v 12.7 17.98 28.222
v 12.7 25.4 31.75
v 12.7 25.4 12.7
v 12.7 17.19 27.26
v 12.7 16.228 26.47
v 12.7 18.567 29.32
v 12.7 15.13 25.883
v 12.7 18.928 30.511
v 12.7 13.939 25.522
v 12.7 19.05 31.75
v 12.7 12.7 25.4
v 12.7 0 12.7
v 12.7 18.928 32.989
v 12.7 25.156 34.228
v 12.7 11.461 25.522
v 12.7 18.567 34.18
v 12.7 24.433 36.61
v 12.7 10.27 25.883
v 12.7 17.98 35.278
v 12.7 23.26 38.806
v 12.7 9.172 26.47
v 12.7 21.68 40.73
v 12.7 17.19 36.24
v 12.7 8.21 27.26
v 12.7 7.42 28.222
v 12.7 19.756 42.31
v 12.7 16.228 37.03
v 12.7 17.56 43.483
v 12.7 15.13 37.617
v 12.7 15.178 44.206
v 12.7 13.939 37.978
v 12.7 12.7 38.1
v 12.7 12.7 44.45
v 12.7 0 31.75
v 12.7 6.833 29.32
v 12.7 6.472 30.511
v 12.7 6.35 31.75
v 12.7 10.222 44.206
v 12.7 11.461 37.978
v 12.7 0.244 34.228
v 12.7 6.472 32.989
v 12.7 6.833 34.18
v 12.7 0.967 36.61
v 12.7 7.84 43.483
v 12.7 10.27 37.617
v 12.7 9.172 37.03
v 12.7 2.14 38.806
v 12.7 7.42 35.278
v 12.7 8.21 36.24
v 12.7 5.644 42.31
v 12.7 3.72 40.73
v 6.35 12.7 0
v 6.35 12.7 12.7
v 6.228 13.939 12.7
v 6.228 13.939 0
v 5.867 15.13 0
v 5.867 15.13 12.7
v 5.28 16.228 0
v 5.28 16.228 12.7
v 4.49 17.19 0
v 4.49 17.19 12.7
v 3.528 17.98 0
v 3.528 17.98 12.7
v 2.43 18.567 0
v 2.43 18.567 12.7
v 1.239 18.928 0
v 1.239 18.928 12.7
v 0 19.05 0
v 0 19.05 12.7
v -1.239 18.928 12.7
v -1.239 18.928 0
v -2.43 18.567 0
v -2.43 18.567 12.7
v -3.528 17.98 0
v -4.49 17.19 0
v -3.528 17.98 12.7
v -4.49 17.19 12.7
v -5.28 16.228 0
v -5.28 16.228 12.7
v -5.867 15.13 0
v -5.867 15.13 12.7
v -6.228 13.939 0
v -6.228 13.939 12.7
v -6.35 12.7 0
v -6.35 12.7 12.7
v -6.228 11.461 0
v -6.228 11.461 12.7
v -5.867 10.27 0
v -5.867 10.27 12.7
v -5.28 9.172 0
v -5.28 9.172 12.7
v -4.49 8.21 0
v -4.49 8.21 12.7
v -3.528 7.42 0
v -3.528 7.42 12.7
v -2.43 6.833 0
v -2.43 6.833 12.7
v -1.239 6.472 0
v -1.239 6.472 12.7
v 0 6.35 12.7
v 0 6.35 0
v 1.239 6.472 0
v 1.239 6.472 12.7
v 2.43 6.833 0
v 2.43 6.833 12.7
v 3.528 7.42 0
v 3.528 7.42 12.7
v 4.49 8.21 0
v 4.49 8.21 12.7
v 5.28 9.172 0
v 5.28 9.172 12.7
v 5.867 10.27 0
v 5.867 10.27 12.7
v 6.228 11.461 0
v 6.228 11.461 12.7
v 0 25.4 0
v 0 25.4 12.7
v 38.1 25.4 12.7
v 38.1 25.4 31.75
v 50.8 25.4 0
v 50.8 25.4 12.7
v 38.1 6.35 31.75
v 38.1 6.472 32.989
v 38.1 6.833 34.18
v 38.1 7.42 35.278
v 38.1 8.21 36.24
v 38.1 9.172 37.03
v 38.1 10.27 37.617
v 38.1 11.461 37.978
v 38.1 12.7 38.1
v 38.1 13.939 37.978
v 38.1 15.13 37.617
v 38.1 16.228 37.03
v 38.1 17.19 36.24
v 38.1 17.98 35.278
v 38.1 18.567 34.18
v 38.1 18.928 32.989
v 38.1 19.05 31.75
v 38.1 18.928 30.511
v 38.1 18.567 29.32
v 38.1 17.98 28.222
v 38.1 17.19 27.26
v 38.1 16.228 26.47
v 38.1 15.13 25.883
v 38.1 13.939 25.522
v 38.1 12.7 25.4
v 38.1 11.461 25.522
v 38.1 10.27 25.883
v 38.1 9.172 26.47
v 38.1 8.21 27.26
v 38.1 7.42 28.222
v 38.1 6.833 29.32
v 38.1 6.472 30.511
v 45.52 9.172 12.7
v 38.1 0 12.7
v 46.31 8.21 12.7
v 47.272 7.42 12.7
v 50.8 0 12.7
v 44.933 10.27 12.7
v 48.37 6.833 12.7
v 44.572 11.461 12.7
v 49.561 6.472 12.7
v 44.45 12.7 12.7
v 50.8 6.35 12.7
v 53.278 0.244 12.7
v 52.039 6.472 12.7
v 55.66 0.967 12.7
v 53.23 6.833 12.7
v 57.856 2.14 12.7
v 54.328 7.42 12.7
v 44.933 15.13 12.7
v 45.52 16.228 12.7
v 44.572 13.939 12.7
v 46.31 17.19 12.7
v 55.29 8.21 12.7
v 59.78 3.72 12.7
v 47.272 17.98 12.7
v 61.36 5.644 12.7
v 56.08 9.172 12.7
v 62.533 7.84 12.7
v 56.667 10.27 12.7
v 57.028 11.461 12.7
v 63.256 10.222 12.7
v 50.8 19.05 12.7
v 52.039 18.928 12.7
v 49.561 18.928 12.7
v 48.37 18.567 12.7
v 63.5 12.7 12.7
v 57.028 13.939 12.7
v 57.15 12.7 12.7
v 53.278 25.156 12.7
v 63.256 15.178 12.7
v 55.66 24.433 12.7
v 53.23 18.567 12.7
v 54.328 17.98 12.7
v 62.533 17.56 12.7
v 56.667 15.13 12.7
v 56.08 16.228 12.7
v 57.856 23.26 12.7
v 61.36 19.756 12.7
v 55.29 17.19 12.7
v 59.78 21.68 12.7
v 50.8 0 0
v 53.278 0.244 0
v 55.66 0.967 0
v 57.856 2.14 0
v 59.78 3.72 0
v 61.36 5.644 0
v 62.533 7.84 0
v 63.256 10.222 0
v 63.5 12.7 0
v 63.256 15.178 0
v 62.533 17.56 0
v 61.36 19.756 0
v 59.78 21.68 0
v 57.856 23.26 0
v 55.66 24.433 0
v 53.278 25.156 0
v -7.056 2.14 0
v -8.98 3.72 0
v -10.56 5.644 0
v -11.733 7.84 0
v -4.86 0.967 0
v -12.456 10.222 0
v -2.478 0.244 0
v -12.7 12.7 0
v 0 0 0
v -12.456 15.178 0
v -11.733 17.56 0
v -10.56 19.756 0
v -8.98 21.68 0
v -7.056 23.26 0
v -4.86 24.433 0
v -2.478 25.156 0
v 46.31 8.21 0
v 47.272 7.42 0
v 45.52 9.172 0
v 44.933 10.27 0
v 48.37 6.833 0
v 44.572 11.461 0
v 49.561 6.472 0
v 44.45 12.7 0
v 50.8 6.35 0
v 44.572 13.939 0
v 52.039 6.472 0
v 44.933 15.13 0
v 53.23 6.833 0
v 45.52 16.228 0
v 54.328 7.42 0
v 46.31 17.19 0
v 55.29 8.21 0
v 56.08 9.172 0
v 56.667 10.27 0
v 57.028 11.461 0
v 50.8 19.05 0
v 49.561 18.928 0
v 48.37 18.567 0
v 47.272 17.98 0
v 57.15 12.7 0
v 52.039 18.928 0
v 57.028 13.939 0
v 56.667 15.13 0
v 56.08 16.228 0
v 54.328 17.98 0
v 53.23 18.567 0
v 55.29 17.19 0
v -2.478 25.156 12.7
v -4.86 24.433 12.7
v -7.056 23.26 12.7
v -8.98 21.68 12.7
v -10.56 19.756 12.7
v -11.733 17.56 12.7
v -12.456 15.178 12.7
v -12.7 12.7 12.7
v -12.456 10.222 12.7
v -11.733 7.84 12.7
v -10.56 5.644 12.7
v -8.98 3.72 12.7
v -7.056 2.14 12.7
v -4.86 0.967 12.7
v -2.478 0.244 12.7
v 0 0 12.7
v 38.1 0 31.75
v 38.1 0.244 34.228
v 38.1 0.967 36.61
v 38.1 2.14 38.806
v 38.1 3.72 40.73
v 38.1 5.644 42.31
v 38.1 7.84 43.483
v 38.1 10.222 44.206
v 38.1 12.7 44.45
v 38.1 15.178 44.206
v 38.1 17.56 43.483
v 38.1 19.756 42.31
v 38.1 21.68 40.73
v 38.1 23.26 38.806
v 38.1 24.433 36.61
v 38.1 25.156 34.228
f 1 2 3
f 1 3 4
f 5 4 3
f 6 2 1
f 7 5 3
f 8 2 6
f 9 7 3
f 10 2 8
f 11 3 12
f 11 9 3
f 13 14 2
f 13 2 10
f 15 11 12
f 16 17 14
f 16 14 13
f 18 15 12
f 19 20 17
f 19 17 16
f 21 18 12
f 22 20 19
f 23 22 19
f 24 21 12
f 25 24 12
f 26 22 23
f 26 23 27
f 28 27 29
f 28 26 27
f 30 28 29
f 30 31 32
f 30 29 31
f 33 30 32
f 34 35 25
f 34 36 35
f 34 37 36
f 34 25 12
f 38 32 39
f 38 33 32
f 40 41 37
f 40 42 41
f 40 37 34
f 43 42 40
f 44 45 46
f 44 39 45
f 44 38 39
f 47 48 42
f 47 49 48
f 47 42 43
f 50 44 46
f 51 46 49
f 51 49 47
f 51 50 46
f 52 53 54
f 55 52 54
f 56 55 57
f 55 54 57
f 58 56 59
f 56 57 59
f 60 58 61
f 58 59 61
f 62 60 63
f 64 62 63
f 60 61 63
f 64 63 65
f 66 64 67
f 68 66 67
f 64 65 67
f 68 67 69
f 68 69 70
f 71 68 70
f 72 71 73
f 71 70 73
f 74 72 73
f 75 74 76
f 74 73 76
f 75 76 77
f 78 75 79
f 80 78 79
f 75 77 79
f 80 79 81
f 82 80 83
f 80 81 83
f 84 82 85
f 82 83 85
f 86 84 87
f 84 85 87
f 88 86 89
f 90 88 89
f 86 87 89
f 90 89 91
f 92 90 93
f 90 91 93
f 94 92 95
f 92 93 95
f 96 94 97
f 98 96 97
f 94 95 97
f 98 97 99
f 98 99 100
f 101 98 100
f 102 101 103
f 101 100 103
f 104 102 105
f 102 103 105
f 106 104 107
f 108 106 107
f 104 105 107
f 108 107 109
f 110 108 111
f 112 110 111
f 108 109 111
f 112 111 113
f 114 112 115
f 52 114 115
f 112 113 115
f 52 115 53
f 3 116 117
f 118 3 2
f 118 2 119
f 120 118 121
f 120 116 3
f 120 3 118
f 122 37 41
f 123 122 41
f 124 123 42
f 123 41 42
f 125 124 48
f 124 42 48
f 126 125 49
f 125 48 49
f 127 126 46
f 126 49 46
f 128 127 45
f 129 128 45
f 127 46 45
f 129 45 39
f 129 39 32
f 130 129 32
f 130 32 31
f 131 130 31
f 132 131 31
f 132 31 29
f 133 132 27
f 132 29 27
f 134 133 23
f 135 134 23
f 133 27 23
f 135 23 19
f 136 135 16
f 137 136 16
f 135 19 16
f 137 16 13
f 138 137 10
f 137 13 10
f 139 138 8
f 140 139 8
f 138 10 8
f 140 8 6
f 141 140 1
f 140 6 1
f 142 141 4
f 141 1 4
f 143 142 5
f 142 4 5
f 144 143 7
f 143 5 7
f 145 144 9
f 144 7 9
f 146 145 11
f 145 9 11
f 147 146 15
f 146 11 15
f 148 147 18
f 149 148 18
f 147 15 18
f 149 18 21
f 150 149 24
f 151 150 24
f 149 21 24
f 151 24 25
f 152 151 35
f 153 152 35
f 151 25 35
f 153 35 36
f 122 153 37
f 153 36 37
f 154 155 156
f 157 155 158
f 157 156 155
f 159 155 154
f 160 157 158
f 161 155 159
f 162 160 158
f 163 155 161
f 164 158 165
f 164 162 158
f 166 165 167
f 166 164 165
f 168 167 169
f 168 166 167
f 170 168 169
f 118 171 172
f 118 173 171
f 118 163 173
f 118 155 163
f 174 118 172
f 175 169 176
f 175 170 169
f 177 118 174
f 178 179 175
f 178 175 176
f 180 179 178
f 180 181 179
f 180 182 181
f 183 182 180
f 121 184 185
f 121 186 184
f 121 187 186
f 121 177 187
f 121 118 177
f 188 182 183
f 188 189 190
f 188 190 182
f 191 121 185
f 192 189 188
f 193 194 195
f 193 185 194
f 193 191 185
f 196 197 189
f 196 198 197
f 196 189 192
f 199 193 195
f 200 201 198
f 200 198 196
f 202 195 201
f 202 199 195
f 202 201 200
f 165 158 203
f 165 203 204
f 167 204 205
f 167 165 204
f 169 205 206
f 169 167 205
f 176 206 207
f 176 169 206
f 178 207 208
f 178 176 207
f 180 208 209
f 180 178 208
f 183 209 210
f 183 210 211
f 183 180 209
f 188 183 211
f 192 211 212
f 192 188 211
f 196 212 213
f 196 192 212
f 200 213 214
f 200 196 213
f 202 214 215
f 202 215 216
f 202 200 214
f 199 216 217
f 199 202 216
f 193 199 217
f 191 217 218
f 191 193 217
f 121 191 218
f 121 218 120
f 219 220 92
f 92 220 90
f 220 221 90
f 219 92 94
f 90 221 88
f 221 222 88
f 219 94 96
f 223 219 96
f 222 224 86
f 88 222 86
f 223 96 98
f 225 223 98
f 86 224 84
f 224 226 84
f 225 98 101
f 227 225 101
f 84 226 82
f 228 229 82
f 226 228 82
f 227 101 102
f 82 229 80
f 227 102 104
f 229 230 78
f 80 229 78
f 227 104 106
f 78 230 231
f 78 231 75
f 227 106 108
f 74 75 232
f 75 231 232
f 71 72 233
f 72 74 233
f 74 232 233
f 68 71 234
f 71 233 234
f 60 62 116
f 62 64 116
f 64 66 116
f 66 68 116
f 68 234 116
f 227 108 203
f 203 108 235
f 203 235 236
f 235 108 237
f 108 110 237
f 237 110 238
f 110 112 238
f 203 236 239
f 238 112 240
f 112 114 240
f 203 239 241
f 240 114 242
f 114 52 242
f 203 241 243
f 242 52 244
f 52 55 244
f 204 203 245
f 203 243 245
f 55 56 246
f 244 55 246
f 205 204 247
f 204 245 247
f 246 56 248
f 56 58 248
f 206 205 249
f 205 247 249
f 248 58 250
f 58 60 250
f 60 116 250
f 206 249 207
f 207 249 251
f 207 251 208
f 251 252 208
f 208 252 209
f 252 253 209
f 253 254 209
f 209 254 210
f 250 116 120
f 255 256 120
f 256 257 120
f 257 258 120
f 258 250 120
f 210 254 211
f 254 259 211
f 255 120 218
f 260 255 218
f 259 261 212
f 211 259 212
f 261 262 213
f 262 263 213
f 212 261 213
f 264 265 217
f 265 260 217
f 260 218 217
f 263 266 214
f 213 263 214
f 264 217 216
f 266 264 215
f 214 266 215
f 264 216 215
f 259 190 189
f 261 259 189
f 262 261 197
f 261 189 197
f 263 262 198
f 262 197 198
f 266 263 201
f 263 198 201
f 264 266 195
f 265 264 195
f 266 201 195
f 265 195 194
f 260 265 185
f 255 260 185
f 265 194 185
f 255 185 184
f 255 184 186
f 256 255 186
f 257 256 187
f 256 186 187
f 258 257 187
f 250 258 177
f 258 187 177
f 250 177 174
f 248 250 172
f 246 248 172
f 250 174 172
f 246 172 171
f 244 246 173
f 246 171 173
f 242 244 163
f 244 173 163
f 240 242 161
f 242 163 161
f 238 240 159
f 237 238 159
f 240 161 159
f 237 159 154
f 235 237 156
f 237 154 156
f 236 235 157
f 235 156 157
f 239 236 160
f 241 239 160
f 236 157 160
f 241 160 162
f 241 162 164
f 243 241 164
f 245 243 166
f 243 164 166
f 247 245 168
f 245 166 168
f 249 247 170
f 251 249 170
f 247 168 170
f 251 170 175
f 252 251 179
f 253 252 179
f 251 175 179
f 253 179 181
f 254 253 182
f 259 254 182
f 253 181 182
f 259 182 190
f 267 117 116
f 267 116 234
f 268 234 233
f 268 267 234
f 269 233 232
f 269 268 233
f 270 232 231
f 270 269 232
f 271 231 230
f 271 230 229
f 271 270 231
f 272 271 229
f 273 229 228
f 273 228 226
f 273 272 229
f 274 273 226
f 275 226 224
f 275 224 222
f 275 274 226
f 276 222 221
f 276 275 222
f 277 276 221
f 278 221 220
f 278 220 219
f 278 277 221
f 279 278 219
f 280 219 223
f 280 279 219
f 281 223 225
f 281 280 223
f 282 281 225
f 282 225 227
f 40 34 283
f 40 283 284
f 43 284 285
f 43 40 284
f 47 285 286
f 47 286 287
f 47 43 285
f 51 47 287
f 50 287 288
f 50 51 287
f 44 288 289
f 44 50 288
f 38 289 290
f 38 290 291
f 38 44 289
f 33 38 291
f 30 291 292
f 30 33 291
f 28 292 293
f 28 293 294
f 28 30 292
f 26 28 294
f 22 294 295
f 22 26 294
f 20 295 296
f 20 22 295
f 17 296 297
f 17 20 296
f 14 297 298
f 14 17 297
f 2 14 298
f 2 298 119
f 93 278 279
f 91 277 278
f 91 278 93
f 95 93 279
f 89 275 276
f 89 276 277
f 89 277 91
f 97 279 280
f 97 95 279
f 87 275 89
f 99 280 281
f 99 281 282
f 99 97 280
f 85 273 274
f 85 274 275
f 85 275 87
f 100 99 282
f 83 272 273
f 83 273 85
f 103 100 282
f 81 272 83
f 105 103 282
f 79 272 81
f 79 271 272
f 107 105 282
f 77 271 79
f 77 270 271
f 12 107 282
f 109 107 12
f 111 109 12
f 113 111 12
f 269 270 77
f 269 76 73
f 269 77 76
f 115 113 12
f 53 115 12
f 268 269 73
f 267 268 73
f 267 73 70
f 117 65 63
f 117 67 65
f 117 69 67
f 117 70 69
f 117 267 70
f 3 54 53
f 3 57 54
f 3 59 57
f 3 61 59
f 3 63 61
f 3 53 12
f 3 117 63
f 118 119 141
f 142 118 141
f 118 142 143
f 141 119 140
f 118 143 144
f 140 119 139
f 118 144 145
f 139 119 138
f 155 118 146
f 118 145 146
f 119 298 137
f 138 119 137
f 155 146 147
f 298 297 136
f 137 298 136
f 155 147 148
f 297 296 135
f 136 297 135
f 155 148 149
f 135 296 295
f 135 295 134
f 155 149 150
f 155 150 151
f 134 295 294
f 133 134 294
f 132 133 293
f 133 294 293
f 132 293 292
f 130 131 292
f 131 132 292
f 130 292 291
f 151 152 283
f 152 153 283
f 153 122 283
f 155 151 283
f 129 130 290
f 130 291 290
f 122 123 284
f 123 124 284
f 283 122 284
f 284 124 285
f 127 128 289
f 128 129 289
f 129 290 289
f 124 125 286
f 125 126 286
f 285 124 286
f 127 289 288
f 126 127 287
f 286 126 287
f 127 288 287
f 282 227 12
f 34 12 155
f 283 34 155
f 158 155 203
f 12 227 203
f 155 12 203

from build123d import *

# Parameters (mm, degrees)
F0_W      = 50.8
F0_H      = 25.4
F1_DEPTH  = 12.7
F2_R      = 12.7
F3_DEPTH  = 12.7
F4_R      = 12.7
F5_DEPTH  = 12.7
F6_W      = 25.4
F6_H      = 25.4
F7_DEPTH  = 19.05
F8_R      = 12.7
F9_DEPTH  = 25.4
F10_R     = 6.35
F11_DEPTH = 25.4
F12_R     = 6.35
F13_DEPTH = 12.7


with BuildPart() as f1:
    # F0 (on Top) → F1 (new body)
    with BuildSketch(Plane.XY):
        with Locations((25.4, 12.7)):
            Rectangle(F0_W, F0_H)
    extrude(amount=F1_DEPTH)

    # F2 (on face) → F3 (join)
    with BuildSketch(Plane.XY.offset(12.7)):
        with Locations((0, 12.7)):
            Circle(F2_R)
    extrude(amount=-F3_DEPTH)

    # F4 (on face) → F5 (join)
    with BuildSketch(Plane.XY.offset(12.7)):
        with Locations((50.8, 12.7)):
            Circle(F4_R)
    extrude(amount=-F5_DEPTH)

    # F6 (on face) → F7 (join)
    with BuildSketch(Plane.XY.offset(12.7)):
        with Locations((25.4, 12.7)):
            Rectangle(F6_W, F6_H)
    extrude(amount=F7_DEPTH)

    # F8 (on face) → F9 (join)
    with BuildSketch(Plane(origin=(12.7, 0, 0), x_dir=(0, -1, 0), z_dir=(-1, 0, 0))):
        with Locations((-12.7, 31.75)):
            Circle(F8_R)
    extrude(amount=-F9_DEPTH)

    # F10 (on face) → F11 (cut)
    with BuildSketch(Plane(origin=(12.7, 0, 0), x_dir=(0, -1, 0), z_dir=(-1, 0, 0))):
        with Locations((-12.7, 31.75)):
            Circle(F10_R)
    extrude(amount=-F11_DEPTH, mode=Mode.SUBTRACT)

    # F12 (on face) → F13 (cut)
    with BuildSketch(Plane.XY.offset(12.7)):
        with Locations((50.8, 12.7)):
            Circle(F12_R)
        with Locations((0, 12.7)):
            Circle(F12_R)
    extrude(amount=-F13_DEPTH, mode=Mode.SUBTRACT)


solid = f1.part
